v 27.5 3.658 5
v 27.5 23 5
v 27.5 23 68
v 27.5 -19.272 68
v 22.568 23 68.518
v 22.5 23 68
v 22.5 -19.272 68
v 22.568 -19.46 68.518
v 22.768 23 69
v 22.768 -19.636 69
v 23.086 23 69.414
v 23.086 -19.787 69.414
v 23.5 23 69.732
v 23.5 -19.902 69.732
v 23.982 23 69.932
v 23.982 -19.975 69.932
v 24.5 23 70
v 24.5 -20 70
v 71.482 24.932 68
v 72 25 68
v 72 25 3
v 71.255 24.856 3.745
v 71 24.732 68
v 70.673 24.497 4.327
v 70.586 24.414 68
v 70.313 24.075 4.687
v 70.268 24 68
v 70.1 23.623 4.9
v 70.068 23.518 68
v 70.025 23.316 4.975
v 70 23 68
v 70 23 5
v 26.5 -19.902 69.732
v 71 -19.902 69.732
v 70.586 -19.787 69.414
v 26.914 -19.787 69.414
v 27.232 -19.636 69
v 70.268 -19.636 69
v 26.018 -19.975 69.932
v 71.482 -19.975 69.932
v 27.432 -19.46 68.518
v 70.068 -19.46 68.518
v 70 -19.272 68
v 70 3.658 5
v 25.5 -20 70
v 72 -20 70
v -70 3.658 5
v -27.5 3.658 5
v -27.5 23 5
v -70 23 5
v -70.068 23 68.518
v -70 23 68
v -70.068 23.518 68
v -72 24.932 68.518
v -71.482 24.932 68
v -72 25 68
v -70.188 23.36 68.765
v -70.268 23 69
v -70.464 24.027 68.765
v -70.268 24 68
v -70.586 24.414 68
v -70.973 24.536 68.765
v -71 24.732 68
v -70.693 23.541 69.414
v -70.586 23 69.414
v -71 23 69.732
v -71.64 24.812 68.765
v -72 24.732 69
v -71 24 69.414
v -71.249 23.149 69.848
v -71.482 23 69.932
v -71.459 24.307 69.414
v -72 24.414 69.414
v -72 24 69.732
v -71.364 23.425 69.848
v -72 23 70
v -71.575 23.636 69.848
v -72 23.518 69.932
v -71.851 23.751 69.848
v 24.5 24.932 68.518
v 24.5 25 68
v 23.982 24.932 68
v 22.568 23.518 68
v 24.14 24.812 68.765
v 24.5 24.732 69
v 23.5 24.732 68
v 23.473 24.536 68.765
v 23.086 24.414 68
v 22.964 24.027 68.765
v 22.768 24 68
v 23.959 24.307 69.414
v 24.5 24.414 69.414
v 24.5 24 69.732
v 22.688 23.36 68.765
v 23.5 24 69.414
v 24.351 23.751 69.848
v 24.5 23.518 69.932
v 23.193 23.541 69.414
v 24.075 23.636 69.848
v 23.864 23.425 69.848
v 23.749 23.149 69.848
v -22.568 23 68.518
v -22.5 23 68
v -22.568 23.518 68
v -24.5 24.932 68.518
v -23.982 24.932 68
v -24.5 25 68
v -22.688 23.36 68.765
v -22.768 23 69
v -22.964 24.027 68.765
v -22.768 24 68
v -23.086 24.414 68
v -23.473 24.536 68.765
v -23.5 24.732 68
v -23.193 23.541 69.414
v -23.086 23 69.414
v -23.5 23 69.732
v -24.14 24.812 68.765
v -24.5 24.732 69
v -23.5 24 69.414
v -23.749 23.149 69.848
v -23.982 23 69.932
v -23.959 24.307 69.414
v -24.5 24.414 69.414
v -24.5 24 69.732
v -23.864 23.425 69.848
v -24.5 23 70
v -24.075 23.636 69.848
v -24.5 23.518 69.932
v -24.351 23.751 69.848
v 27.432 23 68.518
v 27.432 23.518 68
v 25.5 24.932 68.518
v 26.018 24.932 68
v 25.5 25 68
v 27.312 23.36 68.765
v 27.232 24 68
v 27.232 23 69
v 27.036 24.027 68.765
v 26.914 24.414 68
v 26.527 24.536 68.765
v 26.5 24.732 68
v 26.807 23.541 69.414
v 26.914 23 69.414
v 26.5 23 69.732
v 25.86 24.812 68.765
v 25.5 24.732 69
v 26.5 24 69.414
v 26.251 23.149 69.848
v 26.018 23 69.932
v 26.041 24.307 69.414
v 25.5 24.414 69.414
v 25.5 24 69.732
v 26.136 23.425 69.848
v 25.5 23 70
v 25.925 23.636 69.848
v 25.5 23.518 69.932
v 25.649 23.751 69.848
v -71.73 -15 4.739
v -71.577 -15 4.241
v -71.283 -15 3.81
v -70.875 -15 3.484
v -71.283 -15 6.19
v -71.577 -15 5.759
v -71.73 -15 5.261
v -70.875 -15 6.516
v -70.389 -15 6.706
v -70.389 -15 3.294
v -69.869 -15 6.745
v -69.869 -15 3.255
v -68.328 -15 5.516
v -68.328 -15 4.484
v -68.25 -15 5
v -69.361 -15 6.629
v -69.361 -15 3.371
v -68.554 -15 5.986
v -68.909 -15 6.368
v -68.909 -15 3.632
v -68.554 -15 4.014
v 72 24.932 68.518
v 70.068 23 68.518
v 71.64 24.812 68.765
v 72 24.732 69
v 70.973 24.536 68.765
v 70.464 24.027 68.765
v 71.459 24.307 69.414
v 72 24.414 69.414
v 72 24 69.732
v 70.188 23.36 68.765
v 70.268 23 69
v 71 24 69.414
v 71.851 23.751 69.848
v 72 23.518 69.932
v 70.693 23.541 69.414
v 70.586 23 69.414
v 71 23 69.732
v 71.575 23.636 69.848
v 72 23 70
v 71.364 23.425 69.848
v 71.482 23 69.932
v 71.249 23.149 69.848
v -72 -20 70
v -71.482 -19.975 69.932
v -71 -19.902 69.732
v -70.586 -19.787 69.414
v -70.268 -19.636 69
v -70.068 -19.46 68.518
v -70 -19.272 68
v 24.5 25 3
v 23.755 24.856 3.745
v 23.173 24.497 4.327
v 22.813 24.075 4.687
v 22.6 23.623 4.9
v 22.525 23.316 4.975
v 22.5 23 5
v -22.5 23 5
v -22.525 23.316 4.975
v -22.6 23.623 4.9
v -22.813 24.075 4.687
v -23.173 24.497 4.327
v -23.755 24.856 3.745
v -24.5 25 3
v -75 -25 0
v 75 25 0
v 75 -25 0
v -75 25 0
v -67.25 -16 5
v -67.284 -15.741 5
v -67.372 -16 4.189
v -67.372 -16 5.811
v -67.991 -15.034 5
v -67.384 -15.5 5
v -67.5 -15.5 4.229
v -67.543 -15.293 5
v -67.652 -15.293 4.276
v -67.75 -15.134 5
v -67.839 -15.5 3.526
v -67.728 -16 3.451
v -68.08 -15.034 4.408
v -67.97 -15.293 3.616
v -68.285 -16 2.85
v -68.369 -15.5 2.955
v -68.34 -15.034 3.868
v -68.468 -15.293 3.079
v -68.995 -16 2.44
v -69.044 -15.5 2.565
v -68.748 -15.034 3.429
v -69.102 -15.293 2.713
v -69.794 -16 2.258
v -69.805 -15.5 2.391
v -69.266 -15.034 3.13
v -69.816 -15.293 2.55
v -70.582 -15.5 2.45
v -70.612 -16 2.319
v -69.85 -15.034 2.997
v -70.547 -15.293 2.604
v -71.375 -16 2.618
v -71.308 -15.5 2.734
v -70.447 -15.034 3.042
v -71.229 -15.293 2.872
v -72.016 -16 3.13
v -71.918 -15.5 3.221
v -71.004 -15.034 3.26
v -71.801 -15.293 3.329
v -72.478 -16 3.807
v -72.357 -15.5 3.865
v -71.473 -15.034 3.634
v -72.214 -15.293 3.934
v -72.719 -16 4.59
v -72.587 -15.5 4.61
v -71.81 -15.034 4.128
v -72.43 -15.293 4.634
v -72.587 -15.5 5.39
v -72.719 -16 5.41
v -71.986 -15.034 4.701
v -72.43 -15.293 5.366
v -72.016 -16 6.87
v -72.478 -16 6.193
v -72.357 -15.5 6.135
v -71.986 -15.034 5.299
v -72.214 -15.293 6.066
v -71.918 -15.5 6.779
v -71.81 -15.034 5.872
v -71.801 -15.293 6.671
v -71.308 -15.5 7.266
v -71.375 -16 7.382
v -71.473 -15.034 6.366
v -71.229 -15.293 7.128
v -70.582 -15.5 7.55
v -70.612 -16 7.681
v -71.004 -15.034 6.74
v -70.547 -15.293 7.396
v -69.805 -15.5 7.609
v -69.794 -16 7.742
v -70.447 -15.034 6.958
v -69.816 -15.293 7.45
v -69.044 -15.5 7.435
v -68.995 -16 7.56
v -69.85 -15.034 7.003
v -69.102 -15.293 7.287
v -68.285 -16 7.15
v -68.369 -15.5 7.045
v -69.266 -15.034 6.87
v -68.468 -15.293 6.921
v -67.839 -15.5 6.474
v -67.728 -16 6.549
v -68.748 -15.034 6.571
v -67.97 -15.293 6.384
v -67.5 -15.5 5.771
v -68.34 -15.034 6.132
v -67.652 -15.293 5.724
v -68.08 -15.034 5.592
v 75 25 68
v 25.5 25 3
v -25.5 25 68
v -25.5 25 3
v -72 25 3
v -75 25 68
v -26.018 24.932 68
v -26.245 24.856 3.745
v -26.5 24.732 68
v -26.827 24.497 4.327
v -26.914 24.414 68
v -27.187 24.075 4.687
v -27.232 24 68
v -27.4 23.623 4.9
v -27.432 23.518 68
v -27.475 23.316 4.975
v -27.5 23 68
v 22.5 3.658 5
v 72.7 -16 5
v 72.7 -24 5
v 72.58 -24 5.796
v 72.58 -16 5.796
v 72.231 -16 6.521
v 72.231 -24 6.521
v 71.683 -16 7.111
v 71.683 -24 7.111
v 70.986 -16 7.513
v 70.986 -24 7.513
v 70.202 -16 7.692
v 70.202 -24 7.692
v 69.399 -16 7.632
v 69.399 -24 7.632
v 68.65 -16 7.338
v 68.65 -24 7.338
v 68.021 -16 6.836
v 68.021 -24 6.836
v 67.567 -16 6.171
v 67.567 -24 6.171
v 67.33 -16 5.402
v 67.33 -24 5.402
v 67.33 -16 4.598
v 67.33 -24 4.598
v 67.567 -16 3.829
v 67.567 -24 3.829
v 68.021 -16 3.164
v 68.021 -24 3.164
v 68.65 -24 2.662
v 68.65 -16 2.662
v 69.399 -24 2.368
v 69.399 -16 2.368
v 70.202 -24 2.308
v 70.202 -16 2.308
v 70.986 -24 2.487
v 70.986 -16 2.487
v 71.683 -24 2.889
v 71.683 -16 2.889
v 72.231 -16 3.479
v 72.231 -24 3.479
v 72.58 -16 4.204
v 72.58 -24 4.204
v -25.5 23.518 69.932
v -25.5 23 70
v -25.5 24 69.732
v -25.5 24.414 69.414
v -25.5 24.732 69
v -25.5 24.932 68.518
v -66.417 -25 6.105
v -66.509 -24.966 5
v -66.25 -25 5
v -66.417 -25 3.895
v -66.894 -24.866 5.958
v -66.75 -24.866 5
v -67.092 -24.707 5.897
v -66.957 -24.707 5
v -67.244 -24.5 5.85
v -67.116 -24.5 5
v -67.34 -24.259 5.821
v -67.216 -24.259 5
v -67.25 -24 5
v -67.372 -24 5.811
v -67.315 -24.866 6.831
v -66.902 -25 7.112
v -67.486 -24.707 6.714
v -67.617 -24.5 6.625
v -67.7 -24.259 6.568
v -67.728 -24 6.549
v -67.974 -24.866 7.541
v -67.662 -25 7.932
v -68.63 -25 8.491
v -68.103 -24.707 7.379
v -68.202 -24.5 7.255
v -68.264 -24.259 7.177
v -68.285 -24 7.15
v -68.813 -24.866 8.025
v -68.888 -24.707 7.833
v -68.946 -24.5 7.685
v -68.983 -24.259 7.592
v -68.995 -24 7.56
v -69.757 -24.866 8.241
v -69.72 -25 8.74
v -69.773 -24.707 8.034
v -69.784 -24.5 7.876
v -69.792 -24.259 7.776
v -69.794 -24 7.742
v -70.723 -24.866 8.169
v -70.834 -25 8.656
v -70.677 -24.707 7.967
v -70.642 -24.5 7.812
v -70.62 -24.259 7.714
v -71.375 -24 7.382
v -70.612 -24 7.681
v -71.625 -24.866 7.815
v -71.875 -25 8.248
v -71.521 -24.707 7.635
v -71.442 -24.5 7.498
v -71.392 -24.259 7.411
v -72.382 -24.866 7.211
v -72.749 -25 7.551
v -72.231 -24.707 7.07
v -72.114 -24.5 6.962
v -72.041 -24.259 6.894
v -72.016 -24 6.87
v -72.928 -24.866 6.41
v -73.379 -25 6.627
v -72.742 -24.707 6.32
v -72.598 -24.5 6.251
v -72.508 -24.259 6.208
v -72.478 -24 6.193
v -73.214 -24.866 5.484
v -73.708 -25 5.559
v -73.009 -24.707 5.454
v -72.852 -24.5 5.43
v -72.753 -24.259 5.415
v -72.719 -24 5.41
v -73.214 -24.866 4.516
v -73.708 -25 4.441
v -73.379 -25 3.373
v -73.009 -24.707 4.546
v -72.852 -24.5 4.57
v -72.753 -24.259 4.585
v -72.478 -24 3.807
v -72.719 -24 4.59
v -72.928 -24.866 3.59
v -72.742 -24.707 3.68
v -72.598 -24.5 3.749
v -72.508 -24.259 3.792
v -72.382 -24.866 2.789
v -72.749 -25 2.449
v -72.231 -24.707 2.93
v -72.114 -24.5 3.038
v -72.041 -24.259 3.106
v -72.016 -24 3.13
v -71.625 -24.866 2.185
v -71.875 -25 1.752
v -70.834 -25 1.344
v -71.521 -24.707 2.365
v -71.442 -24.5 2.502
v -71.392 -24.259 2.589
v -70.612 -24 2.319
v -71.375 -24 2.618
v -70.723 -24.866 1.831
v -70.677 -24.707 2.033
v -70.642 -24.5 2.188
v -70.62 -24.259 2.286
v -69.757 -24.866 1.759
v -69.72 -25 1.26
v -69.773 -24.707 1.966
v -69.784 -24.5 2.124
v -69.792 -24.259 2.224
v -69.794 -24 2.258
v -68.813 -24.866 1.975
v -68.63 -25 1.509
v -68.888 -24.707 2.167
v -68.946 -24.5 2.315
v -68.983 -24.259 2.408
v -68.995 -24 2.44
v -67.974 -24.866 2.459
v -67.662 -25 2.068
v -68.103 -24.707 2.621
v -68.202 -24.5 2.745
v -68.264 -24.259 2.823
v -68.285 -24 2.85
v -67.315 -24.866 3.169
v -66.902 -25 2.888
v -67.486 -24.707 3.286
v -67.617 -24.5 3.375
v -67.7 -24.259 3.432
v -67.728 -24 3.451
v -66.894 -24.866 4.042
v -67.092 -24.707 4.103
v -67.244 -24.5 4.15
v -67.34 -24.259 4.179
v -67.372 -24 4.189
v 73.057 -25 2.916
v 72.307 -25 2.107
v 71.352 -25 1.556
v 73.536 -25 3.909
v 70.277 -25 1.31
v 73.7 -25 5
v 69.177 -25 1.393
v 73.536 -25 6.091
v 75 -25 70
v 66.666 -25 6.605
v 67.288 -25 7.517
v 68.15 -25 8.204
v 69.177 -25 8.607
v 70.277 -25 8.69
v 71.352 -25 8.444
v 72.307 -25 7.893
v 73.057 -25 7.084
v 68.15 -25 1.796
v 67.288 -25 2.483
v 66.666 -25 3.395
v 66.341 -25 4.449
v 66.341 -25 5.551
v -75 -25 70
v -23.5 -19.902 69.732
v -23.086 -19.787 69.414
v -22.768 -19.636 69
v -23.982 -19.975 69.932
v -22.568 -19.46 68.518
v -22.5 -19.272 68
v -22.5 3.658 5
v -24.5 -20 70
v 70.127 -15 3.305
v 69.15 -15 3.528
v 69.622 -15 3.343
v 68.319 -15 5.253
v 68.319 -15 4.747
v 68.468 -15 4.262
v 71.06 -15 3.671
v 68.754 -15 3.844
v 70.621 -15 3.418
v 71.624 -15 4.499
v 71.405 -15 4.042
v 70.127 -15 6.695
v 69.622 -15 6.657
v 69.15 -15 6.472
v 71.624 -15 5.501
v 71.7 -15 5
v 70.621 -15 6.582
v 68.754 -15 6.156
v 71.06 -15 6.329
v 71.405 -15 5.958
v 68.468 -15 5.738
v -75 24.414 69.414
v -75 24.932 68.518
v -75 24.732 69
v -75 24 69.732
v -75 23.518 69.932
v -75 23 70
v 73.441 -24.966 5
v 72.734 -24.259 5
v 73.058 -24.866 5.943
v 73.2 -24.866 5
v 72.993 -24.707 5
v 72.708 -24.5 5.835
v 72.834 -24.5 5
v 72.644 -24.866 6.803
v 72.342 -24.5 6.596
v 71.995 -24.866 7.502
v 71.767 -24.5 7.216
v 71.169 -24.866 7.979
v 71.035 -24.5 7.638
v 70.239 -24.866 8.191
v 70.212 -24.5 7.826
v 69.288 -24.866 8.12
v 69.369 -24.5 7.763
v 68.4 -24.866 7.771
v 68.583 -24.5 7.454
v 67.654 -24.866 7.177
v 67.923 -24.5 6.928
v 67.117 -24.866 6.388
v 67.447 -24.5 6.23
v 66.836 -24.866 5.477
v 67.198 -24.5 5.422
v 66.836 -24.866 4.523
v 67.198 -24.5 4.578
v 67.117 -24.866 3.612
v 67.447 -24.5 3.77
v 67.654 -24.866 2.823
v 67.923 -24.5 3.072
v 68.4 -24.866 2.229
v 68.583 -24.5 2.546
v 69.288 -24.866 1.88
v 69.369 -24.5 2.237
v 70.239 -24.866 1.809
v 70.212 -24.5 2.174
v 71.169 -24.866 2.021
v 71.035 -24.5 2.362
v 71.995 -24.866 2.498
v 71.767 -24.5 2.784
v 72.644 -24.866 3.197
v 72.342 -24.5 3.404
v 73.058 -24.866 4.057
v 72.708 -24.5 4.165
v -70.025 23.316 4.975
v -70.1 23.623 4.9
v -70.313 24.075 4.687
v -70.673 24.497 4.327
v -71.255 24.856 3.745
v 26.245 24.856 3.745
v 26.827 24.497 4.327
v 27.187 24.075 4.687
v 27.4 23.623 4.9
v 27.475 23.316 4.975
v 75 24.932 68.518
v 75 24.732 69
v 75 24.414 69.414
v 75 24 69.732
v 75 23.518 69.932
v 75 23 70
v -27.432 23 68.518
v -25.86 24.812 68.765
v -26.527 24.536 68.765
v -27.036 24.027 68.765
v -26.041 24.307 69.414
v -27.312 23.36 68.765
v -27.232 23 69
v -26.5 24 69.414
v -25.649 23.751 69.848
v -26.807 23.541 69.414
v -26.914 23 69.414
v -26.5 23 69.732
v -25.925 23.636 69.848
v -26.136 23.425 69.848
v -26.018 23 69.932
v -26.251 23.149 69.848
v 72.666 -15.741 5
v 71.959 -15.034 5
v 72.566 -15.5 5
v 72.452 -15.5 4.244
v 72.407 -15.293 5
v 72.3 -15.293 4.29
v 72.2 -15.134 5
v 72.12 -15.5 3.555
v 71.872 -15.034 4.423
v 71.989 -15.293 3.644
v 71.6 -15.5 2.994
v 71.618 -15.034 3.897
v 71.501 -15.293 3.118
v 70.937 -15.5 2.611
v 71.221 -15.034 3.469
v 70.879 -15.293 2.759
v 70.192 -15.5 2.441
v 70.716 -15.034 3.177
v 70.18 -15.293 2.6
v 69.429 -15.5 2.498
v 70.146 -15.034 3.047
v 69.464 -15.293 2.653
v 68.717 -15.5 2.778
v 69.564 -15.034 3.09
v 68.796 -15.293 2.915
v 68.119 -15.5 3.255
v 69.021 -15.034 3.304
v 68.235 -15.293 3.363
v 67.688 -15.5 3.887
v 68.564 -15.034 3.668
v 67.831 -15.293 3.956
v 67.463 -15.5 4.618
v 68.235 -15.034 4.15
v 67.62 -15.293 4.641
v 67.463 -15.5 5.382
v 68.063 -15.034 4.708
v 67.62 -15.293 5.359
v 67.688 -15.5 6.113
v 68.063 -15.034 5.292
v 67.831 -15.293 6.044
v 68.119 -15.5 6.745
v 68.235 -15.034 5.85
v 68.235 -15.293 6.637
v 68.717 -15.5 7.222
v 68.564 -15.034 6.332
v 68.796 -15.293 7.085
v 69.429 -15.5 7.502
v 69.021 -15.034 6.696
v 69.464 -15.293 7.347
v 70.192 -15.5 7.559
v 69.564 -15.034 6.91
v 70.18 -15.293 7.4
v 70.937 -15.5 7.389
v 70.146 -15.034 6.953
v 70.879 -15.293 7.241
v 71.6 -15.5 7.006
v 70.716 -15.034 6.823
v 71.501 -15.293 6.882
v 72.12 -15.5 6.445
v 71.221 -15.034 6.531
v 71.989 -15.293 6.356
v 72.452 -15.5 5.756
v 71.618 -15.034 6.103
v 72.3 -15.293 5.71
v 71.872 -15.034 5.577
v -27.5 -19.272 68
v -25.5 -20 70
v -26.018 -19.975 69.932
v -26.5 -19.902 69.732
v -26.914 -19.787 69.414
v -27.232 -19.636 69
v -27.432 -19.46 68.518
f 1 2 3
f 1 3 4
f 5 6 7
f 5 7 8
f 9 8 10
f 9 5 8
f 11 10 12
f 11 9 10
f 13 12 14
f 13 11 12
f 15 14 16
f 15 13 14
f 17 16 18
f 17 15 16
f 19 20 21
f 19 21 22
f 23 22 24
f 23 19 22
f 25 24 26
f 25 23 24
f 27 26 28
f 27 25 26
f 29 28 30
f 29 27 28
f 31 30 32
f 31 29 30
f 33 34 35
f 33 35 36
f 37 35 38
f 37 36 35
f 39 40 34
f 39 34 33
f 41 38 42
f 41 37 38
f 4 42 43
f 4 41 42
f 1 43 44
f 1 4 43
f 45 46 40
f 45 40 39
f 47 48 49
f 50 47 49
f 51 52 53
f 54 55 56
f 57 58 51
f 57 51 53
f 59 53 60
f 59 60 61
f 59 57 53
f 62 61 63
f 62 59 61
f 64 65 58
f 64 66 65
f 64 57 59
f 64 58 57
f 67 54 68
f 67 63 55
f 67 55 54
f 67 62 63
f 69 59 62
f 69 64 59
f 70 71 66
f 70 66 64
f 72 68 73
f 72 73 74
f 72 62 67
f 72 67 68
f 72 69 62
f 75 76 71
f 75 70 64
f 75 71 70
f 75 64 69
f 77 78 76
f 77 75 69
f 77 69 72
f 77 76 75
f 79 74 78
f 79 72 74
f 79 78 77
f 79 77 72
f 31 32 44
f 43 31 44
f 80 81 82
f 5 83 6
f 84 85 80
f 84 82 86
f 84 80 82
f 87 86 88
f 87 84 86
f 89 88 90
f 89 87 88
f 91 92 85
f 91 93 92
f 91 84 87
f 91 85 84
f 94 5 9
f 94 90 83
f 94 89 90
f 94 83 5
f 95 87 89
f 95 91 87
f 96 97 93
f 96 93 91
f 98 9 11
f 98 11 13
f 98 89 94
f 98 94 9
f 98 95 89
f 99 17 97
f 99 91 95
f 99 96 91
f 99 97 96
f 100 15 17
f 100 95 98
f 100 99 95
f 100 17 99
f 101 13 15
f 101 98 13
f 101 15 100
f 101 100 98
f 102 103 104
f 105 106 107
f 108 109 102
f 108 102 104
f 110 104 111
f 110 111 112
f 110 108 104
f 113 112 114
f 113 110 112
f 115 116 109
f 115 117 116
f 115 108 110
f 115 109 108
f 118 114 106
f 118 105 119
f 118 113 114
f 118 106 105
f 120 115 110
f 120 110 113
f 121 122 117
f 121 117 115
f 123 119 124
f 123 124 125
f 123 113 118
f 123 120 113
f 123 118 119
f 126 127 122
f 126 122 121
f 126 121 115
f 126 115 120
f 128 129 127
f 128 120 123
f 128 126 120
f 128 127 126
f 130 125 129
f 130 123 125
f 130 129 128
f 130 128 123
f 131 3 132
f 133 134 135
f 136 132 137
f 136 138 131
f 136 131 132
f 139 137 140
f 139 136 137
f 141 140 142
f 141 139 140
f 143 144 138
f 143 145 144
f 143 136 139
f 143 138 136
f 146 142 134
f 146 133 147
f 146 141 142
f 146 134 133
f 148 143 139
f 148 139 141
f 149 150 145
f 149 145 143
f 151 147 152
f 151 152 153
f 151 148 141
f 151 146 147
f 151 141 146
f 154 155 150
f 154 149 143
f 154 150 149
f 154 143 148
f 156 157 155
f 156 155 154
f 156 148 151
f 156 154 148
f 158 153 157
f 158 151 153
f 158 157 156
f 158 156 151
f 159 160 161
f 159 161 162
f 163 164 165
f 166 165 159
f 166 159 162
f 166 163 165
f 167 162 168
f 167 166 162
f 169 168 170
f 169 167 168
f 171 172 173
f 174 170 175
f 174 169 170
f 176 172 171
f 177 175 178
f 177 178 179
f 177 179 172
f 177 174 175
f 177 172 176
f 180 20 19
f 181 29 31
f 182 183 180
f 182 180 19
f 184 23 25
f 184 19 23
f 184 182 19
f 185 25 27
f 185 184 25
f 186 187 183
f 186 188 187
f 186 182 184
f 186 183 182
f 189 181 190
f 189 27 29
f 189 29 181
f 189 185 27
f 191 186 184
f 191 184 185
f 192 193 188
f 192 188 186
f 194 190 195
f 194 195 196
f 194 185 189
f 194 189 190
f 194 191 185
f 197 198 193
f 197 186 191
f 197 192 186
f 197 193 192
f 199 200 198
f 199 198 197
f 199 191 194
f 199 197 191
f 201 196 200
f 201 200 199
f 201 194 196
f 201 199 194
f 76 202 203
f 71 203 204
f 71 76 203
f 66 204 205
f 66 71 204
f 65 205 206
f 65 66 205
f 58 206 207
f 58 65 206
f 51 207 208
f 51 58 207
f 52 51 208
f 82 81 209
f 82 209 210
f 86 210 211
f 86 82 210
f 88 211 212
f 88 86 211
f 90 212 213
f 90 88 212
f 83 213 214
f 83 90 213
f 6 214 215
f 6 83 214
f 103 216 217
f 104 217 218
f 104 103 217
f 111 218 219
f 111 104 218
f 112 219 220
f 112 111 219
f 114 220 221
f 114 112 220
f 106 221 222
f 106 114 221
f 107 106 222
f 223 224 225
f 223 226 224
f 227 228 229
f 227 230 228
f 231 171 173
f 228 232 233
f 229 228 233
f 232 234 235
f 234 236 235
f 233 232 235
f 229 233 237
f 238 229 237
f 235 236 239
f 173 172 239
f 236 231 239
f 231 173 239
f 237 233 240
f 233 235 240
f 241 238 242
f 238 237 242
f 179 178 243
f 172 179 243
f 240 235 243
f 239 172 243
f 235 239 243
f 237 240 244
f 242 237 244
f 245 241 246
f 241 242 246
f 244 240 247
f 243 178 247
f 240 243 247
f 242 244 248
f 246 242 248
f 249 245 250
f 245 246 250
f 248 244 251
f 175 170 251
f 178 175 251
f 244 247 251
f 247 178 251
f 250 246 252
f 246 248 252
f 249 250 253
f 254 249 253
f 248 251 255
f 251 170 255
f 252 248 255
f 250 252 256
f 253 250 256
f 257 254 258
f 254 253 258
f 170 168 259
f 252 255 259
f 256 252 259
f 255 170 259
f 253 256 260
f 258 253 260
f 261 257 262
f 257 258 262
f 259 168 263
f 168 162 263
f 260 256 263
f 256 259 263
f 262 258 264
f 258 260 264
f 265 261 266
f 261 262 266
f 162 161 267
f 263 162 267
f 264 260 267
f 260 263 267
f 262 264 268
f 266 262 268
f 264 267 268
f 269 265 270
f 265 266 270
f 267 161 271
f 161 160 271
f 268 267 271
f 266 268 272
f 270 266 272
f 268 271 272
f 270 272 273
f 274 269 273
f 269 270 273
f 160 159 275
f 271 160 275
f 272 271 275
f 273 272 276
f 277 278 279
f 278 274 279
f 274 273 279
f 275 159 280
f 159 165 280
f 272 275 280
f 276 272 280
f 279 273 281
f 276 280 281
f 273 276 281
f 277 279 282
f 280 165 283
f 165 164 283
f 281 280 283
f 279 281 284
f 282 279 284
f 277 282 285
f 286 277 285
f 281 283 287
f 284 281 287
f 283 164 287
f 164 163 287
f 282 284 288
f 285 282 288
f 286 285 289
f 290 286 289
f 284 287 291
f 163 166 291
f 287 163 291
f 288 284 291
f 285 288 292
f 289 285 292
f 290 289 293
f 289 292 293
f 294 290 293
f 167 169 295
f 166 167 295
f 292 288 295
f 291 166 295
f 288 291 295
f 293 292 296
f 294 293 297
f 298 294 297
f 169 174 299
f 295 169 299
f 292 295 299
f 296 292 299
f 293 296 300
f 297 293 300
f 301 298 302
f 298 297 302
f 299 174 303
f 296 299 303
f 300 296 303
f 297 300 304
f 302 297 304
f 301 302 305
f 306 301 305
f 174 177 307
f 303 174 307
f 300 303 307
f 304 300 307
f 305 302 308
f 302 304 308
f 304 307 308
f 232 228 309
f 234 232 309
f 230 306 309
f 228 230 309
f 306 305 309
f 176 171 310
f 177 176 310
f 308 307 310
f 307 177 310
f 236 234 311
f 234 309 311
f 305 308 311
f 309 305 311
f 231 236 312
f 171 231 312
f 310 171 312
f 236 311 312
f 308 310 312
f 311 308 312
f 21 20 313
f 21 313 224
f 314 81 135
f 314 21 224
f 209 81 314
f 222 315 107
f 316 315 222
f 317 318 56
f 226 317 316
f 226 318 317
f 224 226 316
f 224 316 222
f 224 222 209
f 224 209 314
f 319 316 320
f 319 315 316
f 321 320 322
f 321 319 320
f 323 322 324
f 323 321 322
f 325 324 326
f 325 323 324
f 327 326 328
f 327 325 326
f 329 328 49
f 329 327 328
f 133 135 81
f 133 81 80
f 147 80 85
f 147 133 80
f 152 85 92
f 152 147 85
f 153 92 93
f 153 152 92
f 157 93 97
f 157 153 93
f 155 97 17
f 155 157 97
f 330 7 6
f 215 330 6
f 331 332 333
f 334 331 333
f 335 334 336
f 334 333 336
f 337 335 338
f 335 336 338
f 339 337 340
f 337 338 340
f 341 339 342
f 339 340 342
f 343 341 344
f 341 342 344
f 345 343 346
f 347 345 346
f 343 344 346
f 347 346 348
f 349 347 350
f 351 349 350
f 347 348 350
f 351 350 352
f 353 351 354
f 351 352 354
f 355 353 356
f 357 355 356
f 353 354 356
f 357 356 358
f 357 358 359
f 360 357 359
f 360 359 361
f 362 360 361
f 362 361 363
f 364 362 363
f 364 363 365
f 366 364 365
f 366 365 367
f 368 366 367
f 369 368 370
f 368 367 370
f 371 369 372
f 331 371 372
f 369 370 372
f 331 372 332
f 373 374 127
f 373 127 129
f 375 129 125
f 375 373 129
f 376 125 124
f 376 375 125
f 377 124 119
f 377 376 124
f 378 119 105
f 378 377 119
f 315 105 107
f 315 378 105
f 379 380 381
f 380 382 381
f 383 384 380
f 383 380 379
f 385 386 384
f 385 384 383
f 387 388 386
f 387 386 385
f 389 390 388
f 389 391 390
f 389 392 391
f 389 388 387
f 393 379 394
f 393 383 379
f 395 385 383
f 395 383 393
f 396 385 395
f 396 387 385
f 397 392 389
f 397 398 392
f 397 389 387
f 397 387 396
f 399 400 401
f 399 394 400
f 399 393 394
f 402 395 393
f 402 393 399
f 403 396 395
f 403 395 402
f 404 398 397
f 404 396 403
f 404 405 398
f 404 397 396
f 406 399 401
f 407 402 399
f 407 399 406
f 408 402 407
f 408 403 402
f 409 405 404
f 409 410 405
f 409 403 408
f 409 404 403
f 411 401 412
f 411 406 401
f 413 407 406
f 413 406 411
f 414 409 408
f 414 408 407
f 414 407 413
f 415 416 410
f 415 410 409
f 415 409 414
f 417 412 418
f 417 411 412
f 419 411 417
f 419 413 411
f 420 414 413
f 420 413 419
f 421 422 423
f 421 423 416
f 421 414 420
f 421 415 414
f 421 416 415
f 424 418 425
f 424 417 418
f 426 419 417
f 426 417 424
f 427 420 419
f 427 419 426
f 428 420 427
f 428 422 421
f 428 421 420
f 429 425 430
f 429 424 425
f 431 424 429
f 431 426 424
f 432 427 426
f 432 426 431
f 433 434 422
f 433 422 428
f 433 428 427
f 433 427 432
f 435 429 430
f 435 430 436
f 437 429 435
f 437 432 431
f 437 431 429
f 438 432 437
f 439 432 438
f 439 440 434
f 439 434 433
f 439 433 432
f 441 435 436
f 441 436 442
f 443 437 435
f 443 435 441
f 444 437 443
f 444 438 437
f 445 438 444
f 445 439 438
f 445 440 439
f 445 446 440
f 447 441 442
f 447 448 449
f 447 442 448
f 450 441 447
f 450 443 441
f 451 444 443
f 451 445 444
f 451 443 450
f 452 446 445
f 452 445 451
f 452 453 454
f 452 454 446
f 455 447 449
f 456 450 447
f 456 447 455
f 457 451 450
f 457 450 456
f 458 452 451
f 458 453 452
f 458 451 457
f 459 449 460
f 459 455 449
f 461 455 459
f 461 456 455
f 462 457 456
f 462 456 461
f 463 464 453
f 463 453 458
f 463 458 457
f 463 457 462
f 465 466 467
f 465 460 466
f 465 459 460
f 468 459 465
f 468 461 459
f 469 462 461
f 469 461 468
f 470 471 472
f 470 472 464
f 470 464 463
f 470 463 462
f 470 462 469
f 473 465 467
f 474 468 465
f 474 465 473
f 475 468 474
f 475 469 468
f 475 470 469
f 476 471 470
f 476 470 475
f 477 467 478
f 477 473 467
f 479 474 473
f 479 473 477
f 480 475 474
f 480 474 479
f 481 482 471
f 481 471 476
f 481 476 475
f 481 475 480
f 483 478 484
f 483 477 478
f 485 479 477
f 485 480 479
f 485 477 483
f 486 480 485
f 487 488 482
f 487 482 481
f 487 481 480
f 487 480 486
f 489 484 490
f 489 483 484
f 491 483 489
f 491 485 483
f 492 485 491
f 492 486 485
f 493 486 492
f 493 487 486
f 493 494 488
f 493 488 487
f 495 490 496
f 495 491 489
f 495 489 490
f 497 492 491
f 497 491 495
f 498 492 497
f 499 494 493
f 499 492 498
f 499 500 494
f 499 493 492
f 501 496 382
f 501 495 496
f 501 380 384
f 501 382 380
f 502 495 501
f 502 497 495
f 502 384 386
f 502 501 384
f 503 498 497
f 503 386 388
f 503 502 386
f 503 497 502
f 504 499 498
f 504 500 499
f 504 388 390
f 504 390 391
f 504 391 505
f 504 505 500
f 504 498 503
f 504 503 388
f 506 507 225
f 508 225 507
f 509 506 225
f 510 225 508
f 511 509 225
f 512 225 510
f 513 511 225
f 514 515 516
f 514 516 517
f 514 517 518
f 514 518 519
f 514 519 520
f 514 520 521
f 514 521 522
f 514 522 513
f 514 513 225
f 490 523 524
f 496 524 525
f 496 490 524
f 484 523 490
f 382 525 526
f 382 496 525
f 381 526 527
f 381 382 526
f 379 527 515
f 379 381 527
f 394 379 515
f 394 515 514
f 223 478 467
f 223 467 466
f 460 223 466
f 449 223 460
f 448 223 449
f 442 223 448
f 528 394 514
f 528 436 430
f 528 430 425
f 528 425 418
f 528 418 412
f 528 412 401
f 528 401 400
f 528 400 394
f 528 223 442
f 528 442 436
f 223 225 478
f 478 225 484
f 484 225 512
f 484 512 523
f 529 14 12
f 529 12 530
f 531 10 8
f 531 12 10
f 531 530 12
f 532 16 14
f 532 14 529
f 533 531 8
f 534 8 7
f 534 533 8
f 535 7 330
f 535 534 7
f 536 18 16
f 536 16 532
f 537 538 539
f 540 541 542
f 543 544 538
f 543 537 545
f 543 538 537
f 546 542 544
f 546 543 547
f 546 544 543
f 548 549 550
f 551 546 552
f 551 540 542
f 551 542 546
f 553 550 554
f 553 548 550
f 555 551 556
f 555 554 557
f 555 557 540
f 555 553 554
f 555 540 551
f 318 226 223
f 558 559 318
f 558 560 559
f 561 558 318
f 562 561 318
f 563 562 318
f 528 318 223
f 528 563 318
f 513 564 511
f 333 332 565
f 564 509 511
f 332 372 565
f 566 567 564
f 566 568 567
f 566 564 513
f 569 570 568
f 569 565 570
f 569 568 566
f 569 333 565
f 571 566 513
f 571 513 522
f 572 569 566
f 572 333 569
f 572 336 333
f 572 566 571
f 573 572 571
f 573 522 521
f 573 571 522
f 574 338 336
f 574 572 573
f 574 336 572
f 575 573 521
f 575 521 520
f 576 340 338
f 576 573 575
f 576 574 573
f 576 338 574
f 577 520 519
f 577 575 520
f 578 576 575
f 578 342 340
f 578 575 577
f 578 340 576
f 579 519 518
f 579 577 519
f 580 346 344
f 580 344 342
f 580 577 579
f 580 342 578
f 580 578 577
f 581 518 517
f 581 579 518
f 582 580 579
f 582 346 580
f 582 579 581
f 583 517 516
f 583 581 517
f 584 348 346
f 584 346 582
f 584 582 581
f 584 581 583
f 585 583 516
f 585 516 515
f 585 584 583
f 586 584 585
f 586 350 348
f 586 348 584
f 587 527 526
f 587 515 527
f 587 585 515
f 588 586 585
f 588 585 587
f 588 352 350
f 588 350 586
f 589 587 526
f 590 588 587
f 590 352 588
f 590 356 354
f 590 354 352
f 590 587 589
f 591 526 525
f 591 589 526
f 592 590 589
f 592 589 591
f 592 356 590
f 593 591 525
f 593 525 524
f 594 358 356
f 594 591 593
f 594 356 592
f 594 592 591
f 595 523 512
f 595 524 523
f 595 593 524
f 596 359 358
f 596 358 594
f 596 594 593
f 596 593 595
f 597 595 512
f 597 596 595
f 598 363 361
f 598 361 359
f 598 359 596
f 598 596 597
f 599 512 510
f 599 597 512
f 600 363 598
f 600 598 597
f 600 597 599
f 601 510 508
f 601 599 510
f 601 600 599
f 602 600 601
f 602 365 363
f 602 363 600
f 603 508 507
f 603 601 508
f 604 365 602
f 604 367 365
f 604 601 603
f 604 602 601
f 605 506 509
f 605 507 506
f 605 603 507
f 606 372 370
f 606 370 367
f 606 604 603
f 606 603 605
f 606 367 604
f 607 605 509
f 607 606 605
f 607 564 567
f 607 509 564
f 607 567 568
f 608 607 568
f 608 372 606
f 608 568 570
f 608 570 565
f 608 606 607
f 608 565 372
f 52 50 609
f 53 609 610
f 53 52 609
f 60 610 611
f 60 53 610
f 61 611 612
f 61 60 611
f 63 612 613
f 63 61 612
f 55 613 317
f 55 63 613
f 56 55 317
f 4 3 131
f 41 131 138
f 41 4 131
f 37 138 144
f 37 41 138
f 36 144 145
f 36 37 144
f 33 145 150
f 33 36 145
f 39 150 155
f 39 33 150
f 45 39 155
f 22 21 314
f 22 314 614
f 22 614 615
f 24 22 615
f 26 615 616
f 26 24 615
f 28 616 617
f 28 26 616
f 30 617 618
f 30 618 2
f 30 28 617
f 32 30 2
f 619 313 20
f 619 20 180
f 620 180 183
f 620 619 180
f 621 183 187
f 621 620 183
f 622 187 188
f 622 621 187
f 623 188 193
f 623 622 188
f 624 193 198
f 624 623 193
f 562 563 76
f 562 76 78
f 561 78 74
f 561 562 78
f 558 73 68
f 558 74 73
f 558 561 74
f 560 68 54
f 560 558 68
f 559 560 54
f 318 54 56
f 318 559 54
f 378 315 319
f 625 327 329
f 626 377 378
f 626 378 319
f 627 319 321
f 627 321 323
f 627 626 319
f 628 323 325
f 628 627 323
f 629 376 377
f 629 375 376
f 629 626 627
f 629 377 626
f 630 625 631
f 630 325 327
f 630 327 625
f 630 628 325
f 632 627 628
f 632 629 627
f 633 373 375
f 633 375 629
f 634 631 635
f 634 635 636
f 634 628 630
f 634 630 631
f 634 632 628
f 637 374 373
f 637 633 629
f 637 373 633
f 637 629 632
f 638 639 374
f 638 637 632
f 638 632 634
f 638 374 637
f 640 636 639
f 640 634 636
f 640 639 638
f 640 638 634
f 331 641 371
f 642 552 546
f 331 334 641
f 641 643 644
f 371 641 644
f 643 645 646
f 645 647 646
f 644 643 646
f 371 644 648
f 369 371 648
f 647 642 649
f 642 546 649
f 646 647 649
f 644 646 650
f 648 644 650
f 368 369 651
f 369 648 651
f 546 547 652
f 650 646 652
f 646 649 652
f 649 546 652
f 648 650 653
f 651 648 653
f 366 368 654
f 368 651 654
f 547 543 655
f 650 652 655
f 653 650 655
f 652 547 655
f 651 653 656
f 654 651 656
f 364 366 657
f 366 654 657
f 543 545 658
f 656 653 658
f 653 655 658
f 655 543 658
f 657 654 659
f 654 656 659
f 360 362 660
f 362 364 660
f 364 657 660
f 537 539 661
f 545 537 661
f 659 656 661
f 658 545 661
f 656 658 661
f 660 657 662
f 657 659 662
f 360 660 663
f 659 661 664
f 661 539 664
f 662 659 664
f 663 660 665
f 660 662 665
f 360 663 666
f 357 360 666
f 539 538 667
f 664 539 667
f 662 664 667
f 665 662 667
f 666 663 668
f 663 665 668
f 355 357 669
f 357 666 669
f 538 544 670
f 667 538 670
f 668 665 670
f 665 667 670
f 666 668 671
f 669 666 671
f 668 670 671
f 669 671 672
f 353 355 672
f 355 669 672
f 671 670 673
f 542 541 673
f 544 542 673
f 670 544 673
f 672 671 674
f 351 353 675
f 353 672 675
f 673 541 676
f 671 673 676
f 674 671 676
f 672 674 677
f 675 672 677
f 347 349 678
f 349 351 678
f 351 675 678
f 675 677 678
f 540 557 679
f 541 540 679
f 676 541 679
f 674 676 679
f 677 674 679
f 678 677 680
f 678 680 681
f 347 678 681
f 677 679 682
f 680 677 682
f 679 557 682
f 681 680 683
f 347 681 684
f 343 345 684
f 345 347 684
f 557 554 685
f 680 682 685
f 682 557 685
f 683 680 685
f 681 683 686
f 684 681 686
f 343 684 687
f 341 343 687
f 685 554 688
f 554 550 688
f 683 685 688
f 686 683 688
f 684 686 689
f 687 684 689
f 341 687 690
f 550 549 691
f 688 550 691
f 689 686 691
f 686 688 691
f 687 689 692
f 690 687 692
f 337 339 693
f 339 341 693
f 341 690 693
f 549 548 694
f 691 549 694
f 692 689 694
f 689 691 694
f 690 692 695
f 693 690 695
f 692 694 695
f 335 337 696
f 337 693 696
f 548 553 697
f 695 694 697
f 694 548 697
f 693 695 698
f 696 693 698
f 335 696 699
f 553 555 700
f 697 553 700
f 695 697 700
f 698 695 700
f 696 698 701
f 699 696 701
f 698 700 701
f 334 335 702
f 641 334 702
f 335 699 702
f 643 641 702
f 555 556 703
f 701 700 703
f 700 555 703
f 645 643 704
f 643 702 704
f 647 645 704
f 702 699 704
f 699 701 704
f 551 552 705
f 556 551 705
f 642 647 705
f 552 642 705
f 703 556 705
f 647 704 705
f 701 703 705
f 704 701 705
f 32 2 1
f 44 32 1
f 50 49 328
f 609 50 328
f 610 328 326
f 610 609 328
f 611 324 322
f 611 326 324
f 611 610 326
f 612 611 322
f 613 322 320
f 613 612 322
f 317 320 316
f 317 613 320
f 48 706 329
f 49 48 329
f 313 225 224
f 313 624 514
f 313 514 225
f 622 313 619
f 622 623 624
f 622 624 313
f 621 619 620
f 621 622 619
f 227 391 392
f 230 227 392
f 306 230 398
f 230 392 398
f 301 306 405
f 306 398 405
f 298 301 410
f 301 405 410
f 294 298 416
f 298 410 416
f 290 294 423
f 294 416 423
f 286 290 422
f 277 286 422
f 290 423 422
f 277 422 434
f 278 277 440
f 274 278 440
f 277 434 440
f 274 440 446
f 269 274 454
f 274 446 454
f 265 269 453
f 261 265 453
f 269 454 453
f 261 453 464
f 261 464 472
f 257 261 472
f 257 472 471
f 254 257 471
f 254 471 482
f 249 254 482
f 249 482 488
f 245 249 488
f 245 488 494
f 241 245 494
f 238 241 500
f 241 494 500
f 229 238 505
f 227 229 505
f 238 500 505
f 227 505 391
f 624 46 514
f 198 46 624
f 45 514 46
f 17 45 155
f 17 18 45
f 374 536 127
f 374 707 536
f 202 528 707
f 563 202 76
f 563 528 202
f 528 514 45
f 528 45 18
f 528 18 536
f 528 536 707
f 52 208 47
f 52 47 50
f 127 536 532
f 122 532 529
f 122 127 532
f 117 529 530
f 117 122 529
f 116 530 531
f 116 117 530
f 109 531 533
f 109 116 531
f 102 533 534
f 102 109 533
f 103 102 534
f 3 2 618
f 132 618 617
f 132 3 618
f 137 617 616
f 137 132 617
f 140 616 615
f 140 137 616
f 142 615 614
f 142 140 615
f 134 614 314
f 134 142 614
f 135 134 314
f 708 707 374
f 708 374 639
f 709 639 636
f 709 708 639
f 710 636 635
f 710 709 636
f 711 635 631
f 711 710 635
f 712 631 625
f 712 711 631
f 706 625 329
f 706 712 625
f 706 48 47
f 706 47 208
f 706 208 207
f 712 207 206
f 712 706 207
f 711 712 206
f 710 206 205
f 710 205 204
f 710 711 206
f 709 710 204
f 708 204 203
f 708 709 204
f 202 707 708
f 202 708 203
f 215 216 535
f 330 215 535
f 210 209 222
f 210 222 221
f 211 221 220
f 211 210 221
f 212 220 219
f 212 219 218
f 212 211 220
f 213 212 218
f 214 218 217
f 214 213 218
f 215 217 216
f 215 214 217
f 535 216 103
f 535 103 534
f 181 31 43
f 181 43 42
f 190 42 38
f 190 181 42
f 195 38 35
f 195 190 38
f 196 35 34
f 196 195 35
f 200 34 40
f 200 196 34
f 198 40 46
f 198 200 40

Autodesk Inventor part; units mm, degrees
ref_plane "YZ Plane" through (0, 0, 0) normal (1, 0, 0) x (0, 1, 0)
ref_plane "XZ Plane" through (0, 0, 0) normal (0, 1, 0) x (-1, 0, 0)
ref_plane "XY Plane" through (0, 0, 0) normal (0, 0, 1) x (1, 0, 0)
sketch "Sketch1" plane through (0, 0, 0) normal (0, 0, 1) x (1, 0, 0)
  line L0 (-75, 25) -> (75, 25)
  line L1 (75, 25) -> (75, -25)
  line L2 (75, -25) -> (-75, -25)
  line L3 (-75, -25) -> (-75, 25)
  line L4 (-75, 25) -> (75, -25) construction
  line L5 (75, 25) -> (-75, -25) construction
  line L6 (25, 25) -> (25, -25)
  line L7 (22.5, 25) -> (27.5, 25)
  line L8 (27.5, 25) -> (27.5, -25)
  line L9 (27.5, -25) -> (22.5, -25)
  line L10 (22.5, -25) -> (22.5, 25)
  line L11 (22.5, 25) -> (27.5, -25) construction
  line L12 (27.5, 25) -> (22.5, -25) construction
  line L13 (75, 25) -> (70, 25)
  line L14 (70, 25) -> (70, -25)
  line L15 (70, -25) -> (75, -25)
  line L16 (75, -25) -> (75, 25)
  point P0 (0, 0)
  point P1 (25, 0)
  point P2 (22.5, 25)
  point P3 (22.5, -25)
  point P4 (27.5, -25)
  point P5 (27.5, 25)
  dimension "d0" = 50
  dimension "d1" = 150
  dimension "d9" = 50
  dimension "d14" = 5
  dimension "d15" = 5
sketch "Sketch2" plane through (0, 0, 0) normal (1, 0, 0) x (0, 1, 0)
  line L0 (25, 0) -> (-25, 0) projected
  line L1 (25, 0) -> (-25, 0)
  line L2 (-25, 0) -> (-25, 70)
  line L3 (-25, 70) -> (25, 70)
  line L4 (25, 70) -> (25, 0)
  line L5 (-20, 70) -> (5.4779, 0)
  line L6 (25, 5) -> (-25, 5)
  line L7 (-20, 70) -> (-20, 0)
  point P0 (0, 0)
  point P1 (5.4779, 0)
  point P2 (3.6581, 5)
  dimension "d2" = 70
  dimension "d3" = 5
  dimension "d5" = 5
  dimension "d20" = 20
extrude "Extrusion1" add sketch "Sketch2" along normal blind 75 contours L0 L7 L6 L5 | L0 L2 L6 L7 | L6 L7 L5 | L6 L2 L3 L7
extrude "Extrusion2" add sketch "Sketch2" along normal blind 75 contours L0 L5 L6 L4
extrude "Extrusion3" add sketch "Sketch1" along normal blind 70 contours L0 L1 L2 L14
extrude "Extrusion4" add sketch "Sketch1" along normal blind 70 contours L0 L6 L2 L10 | L0 L8 L2 L6
mirror "Mirror1" about plane through (0, 0, 0) normal (1, 0, 0)
fillet "Fillet1" radius 2 9 edges at (-27.5, 25, 37.5) (-22.5, 25, 37.5) (22.5, 25, 37.5) (27.5, 25, 37.5) (70, 25, 37.5) (-70, 25, 37.5) (-48.75, 25, 5) (0, 25, 5) (48.75, 25, 5)
fillet "Fillet2" radius 2 10 edges at (-25, 25, 70) (-22.5, 1.5, 70) (-27.5, 1.5, 70) (25, 25, 70) (27.5, 1.5, 70) (22.5, 1.5, 70) (73.5, 25, 70) (70, 1.5, 70) (-73.5, 25, 70) (-70, 1.5, 70)
sketch "Sketch3" plane through (75, -25, 0) normal (0, -1, 0) x (1, 0, 0)
  line L0 (0, 0) -> (-150, 0) projected
  line L1 (0, 70) -> (0, 0) projected
  line L2 (-150, 70) -> (0, 70) projected
  line L3 (-150, 70) -> (-150, 0) projected
  line L4 (-145, 5) -> (-5, 5)
  line L5 (-5, 5) -> (-5, 65)
  line L6 (-5, 65) -> (-145, 65)
  line L7 (-145, 65) -> (-145, 5)
  circle A0 centre (-5, 5) radius 2.7
  circle A1 centre (-145, 5) radius 2.75
  point P0 (-75, 0)
  dimension "d35" = 5
  dimension "d36" = 5.4
  dimension "d37" = 5.5
extrude "Extrusion5" cut sketch "Sketch3" against normal blind 10 contours L7 A1 L4 | L4 A1 L7 | A0 L5 L4 | L4 L5 A0
fillet "Fillet3" radius 1 2 edges at (67.3, -25, 5) (-72.75, -25, 5)
ref_plane "Work Plane2" through (75, -25, 5) normal (0, 0, -1) x (-1, 0, 0)
fillet "Fillet4" radius 1 1 edges at (-72.75, -15, 5)
fillet "Fillet5" radius 1 1 edges at (67.3, -15, 5)
equation "\"d9\" = 0.333333 * d1"
equation "\"d5\" = d3"
equation "\"d10\" = 0.5 * d1"
equation "\"d12\" = 0.5 * d1"
equation "\"d16\" = d2"
equation "\"d18\" = d2"
properties part number "rubbish-container-group2" material "ABS Plastic"
